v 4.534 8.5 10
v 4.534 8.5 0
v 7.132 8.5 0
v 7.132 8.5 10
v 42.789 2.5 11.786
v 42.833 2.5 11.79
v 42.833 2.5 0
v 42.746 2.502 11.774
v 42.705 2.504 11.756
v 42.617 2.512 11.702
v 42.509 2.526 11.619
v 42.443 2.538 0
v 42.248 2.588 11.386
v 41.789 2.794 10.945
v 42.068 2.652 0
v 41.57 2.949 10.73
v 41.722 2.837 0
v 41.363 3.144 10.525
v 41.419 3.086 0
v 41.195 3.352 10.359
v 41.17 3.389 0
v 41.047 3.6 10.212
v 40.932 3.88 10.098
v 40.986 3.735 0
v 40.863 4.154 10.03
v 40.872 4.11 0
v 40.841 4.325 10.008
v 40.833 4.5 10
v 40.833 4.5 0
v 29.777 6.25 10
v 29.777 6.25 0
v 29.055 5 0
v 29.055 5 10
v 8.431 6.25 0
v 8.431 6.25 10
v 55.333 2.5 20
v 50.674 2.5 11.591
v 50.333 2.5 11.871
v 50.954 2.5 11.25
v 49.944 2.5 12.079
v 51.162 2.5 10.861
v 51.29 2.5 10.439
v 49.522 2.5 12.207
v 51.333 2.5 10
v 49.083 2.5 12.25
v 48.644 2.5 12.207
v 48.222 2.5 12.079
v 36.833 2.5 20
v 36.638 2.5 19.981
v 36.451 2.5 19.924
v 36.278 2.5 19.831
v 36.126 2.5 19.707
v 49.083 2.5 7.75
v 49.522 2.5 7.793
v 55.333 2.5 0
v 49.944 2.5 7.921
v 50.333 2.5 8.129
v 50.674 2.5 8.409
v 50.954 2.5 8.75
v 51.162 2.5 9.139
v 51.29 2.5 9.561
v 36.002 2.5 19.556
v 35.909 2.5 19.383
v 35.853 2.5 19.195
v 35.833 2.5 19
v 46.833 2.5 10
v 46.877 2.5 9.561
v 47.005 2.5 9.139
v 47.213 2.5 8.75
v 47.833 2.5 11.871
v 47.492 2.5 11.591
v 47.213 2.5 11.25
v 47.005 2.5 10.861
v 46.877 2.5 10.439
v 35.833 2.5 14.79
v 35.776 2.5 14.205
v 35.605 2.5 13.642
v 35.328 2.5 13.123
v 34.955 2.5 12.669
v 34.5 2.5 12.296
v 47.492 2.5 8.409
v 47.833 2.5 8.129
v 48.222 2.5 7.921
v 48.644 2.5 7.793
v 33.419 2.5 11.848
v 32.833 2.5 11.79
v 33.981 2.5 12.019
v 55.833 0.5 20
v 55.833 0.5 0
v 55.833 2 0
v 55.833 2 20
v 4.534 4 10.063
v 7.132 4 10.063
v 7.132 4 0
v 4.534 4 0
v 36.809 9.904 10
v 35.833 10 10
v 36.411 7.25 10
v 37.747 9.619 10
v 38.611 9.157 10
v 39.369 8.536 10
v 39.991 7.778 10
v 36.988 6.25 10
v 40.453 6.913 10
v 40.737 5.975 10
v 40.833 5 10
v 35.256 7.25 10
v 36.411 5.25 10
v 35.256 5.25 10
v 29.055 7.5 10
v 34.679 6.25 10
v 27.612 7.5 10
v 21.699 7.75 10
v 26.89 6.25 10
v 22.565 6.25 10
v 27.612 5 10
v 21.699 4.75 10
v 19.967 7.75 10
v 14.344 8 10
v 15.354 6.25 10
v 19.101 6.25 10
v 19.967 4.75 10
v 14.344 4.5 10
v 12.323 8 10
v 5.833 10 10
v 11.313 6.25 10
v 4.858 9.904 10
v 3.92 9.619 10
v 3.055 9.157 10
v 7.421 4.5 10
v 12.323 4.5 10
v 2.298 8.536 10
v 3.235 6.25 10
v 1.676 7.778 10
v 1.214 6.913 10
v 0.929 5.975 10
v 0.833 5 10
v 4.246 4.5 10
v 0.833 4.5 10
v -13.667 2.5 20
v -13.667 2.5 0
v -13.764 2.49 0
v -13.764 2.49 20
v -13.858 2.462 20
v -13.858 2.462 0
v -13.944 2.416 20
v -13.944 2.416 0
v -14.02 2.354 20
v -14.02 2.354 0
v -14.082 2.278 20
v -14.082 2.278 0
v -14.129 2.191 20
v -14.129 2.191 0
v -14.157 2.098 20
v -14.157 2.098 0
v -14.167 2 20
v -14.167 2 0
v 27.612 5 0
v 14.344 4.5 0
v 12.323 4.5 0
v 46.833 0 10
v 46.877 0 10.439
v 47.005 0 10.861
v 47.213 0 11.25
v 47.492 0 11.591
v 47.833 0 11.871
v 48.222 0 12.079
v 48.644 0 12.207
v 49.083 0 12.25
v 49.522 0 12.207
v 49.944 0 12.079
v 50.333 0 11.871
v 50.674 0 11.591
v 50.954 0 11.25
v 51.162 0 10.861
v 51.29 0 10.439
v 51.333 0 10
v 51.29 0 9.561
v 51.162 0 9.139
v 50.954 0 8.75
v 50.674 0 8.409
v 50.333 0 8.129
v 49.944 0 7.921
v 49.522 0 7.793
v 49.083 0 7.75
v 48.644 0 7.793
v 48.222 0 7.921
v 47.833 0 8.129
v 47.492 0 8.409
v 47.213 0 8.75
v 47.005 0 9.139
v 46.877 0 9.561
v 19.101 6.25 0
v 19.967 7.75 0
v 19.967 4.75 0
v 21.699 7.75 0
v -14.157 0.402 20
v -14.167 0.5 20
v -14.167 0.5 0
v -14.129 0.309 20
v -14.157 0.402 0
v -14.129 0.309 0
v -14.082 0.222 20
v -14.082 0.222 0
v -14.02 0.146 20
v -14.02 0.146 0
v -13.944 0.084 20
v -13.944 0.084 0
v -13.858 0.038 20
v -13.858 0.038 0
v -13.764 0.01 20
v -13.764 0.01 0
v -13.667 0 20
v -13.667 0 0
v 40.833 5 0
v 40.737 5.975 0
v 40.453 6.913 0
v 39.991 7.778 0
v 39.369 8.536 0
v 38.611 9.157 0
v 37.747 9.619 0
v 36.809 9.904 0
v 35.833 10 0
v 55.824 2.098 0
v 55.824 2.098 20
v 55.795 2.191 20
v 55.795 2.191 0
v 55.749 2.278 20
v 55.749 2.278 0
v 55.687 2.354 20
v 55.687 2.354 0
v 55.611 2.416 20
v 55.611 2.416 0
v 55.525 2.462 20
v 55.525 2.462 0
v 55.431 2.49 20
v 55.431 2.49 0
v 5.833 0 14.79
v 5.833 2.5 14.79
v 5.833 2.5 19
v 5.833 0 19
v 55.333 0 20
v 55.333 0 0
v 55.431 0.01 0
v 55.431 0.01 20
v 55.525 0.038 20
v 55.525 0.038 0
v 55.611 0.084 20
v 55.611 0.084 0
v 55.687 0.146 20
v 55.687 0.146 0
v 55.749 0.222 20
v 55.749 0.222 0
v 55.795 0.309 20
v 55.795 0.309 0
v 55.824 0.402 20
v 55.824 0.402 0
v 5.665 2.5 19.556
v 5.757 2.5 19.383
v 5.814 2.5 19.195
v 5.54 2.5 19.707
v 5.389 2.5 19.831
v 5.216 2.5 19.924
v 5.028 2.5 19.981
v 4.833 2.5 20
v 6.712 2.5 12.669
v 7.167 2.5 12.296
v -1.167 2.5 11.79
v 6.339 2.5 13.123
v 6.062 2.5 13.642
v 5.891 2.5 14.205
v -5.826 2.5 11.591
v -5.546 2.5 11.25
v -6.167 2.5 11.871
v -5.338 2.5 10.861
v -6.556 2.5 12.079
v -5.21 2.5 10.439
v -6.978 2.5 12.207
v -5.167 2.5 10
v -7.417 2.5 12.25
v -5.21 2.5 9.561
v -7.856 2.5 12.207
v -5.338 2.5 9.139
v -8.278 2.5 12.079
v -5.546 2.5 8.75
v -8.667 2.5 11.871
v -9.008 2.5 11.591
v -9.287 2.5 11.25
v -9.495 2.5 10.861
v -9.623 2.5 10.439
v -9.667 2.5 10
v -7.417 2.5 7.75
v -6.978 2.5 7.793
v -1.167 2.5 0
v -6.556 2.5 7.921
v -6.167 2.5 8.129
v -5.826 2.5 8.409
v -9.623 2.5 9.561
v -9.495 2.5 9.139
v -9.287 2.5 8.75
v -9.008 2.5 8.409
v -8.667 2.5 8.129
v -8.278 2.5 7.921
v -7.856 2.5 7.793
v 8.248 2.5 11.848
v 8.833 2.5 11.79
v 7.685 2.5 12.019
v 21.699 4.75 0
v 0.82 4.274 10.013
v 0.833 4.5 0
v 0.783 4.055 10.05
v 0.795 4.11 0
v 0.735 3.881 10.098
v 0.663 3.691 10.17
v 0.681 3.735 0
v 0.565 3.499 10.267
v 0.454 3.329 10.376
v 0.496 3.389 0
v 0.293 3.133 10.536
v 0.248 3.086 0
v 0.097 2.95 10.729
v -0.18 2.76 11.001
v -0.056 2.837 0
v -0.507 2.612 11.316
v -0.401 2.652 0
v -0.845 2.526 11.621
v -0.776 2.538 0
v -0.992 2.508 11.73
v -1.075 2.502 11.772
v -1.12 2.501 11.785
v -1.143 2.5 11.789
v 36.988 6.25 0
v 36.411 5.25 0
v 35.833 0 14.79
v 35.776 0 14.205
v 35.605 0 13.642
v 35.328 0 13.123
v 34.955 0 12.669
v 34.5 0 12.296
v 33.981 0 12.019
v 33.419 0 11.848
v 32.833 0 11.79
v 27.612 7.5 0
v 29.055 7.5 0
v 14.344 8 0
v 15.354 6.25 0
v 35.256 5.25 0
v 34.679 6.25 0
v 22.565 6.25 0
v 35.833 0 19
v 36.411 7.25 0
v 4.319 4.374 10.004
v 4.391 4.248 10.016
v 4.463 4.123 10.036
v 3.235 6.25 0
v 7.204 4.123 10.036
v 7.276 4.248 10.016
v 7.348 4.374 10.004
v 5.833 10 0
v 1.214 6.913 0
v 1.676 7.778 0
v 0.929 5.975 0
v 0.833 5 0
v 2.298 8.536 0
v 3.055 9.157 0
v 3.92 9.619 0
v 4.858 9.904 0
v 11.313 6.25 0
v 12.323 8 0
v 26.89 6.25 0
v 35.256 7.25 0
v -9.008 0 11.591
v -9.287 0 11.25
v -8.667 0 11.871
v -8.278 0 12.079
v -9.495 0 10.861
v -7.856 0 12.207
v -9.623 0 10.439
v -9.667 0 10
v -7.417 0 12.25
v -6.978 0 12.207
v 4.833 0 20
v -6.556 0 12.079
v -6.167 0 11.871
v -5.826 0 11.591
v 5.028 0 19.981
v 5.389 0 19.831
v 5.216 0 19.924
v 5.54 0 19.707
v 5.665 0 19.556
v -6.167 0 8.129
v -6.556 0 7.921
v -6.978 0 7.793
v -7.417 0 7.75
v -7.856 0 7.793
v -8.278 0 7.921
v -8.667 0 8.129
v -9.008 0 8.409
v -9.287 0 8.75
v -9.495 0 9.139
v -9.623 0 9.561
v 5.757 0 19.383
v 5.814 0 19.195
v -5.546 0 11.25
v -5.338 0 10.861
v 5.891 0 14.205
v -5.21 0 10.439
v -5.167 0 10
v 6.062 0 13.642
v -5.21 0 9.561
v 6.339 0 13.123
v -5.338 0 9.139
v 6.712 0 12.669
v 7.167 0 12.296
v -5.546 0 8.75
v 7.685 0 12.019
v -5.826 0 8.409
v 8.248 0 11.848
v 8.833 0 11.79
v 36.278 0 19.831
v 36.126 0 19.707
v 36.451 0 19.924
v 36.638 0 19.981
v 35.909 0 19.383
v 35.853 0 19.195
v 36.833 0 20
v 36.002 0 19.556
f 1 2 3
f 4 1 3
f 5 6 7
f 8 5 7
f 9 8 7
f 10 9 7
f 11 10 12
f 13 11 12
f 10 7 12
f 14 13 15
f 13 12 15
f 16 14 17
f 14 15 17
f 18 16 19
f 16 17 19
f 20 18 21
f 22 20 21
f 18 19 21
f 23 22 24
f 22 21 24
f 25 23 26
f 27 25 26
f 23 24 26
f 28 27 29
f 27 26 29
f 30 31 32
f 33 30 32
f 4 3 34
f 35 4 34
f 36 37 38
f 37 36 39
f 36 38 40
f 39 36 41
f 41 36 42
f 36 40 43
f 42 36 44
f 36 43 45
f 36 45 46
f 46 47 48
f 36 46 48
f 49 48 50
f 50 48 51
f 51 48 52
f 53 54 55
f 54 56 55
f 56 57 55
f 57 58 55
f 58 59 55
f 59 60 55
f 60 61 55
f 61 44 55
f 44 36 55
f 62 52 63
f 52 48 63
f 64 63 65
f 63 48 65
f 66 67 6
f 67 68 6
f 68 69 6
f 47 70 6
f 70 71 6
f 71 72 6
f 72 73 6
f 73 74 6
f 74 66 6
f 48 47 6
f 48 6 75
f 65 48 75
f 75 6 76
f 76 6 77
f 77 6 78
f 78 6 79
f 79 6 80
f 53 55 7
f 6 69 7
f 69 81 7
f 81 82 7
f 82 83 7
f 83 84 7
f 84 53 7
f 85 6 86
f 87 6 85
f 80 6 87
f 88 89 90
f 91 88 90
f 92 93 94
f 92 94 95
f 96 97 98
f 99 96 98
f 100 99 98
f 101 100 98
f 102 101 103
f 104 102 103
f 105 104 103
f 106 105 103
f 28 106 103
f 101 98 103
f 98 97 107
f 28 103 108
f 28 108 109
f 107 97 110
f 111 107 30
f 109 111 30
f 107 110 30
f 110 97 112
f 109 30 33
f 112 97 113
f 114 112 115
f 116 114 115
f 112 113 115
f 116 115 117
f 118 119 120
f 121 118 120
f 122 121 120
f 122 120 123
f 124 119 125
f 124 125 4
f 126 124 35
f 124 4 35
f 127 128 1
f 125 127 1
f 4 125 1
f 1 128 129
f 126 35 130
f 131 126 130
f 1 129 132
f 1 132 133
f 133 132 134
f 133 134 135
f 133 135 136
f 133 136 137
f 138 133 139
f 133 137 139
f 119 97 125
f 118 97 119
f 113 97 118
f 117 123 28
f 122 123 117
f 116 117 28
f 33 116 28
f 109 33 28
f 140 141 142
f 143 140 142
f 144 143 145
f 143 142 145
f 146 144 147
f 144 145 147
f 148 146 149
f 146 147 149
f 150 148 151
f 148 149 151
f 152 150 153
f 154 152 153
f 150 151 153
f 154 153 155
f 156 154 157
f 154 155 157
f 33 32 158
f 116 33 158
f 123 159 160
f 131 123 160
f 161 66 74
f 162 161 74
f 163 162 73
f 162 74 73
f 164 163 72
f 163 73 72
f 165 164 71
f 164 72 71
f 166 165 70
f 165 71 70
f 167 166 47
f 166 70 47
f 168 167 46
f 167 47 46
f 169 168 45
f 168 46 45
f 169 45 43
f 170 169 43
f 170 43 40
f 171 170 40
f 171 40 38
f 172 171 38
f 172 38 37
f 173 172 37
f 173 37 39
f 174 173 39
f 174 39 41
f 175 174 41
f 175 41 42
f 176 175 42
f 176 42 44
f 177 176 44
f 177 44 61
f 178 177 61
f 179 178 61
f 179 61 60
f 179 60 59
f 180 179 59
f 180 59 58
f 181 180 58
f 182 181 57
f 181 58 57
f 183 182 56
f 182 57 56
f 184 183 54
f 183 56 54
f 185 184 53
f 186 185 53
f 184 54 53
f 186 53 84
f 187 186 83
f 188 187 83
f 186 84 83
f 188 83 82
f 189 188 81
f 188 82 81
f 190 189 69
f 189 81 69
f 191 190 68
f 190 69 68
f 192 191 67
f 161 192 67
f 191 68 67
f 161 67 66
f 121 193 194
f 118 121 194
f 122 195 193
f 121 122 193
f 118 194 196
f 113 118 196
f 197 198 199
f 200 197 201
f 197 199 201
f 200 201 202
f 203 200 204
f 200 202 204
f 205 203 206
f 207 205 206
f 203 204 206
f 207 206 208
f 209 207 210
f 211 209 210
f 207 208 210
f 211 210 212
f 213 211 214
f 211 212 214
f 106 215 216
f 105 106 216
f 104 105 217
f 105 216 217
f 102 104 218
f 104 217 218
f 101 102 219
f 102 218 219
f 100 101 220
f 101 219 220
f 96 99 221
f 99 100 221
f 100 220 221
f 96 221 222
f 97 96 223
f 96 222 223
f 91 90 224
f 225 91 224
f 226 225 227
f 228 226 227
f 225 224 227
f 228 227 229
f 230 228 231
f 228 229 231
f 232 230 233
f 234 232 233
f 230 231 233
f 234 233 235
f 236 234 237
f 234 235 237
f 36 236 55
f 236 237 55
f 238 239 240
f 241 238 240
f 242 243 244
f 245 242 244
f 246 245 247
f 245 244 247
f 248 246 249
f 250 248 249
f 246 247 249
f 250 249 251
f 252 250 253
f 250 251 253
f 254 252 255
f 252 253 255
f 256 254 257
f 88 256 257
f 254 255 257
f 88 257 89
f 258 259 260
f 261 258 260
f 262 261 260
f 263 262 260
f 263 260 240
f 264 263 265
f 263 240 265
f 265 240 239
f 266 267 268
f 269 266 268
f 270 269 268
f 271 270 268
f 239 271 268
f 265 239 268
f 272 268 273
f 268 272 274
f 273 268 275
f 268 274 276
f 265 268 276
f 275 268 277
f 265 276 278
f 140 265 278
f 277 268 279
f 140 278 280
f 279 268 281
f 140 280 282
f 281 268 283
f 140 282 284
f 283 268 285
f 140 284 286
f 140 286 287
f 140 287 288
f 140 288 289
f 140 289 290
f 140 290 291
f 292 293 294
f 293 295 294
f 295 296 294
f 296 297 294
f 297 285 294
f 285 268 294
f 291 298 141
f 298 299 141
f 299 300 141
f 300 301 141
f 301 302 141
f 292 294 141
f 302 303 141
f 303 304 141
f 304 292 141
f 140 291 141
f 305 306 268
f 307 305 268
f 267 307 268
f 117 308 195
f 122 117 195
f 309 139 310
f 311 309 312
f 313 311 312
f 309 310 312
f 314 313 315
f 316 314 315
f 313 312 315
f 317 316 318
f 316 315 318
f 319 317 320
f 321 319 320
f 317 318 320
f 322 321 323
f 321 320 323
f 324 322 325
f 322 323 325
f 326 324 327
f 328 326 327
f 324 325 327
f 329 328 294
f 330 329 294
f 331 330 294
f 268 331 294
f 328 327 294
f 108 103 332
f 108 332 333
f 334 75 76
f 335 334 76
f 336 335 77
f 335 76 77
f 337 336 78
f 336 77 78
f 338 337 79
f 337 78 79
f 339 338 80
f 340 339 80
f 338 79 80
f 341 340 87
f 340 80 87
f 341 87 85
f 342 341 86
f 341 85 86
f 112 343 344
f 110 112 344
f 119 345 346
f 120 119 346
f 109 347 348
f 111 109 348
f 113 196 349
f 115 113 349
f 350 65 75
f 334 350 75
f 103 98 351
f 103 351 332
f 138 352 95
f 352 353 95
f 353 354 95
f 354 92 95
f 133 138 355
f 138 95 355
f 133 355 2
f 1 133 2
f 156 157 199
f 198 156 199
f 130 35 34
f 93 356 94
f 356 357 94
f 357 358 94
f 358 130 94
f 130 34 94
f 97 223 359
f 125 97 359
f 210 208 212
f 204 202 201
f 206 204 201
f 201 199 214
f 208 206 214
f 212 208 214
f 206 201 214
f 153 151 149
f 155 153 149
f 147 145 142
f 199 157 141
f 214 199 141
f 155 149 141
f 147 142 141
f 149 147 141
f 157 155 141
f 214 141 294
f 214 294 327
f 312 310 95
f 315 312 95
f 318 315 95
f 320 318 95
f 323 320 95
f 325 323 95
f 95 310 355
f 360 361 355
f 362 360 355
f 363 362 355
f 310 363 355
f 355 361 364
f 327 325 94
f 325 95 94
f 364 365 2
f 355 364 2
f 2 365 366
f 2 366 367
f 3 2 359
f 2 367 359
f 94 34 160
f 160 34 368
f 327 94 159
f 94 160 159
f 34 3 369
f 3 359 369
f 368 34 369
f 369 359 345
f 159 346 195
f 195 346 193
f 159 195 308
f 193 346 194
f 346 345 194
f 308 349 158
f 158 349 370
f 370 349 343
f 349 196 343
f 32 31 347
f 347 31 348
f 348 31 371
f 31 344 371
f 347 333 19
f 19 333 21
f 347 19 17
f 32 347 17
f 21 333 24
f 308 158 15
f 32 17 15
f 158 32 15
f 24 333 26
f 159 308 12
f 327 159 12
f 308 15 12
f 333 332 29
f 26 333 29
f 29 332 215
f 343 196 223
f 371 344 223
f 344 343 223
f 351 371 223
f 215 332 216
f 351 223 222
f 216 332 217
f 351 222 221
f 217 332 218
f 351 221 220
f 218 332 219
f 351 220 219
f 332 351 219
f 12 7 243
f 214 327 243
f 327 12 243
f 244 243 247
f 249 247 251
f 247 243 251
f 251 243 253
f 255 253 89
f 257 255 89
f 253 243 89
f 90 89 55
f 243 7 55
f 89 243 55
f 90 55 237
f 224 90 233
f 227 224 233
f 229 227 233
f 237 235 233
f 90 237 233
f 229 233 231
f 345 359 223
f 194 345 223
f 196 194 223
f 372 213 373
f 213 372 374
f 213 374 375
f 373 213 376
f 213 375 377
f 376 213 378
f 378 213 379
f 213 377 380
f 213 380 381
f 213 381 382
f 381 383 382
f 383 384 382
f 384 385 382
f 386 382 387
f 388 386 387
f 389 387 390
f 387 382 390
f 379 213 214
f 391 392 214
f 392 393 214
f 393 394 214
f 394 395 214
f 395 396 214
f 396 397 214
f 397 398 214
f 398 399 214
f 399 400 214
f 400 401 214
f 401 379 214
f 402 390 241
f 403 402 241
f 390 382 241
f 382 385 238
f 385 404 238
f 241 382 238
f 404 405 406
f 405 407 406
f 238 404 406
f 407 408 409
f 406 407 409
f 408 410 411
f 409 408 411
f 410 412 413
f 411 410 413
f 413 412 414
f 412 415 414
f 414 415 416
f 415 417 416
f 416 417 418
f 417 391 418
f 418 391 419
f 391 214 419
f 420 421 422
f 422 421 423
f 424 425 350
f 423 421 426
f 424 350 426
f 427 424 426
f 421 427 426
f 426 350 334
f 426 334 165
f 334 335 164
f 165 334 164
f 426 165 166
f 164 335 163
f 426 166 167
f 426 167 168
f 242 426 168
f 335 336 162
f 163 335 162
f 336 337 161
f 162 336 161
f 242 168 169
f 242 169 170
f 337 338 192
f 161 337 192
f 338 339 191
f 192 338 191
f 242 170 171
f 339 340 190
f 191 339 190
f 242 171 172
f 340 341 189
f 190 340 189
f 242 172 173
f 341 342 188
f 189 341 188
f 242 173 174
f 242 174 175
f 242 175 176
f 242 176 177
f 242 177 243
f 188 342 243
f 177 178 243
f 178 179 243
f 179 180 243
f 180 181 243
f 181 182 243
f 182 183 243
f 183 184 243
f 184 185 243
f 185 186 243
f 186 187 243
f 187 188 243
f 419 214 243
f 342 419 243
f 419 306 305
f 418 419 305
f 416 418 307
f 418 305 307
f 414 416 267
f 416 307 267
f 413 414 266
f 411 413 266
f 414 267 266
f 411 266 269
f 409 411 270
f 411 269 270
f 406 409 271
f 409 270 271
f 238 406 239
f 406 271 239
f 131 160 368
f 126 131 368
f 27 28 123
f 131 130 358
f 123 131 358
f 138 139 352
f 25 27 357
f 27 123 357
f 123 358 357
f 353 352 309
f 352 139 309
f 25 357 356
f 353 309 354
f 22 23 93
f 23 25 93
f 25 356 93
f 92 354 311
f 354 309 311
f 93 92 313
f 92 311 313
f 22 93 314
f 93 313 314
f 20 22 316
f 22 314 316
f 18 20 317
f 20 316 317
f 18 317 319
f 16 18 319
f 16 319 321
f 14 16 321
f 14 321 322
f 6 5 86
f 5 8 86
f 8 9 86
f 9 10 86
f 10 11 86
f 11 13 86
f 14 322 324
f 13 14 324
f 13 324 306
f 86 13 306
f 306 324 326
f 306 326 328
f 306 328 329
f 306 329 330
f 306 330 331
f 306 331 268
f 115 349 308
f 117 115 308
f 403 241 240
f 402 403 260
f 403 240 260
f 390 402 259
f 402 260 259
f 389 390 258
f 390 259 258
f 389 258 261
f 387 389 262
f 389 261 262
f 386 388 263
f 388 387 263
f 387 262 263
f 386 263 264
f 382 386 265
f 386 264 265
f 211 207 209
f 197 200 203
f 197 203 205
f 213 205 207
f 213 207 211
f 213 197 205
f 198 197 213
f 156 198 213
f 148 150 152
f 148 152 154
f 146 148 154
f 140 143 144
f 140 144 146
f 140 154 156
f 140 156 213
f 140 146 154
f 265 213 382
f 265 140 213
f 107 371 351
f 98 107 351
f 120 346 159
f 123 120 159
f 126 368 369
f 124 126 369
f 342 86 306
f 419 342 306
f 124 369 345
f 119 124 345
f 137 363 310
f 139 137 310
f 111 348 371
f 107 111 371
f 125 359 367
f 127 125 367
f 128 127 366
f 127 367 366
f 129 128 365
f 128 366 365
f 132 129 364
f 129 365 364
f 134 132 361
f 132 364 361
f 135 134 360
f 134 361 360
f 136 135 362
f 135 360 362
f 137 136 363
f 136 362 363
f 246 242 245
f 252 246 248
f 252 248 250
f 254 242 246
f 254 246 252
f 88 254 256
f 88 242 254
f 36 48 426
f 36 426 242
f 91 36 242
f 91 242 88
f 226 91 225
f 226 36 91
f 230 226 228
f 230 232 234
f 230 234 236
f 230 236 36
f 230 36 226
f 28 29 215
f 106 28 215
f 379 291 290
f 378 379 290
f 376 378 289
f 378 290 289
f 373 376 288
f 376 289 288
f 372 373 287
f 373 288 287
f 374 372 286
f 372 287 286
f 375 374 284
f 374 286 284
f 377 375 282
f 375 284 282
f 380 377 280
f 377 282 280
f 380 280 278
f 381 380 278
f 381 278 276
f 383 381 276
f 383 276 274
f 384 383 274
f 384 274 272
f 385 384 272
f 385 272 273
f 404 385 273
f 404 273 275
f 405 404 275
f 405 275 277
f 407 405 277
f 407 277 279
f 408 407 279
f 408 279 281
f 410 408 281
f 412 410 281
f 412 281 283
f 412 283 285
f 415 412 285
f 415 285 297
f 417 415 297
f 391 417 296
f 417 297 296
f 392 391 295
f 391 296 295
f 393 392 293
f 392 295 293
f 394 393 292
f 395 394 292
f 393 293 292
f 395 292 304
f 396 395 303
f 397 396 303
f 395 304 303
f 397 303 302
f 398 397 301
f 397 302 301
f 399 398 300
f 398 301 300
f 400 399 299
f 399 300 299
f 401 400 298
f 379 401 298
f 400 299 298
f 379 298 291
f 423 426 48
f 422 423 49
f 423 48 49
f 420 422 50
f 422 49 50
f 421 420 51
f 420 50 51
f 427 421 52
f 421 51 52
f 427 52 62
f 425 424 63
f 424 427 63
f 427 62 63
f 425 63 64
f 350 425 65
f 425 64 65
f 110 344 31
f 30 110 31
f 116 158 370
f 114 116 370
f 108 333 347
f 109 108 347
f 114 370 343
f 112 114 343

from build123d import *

# Parameters (mm, degrees)
F1_DEPTH = 20
F2_R     = 2.25
F3_DEPTH = 25
F6_DEPTH = 200
F8_DEPTH = 25


with BuildPart() as f1:
    # F0 (on Top) → F1 (new body)
    with BuildSketch(Plane.XY):
        with BuildLine():
            Line((-14.1666658925, 2), (-14.1666658925, 0.5))
            ThreePointArc((-14.1666658925, 0.5), (-14.0202192831, 0.1464466094), (-13.6666658925, 0))
            Line((-13.6666658925, 0), (55.3333341075, 0))
            ThreePointArc((55.3333341075, 0), (55.6868874981, 0.1464466094), (55.8333341075, 0.5))
            Line((55.8333341075, 0.5), (55.8333341075, 2))
            ThreePointArc((55.8333341075, 2), (55.6868874981, 2.3535533906), (55.3333341075, 2.5))
            Line((55.3333341075, 2.5), (42.8333341075, 2.5))
            ThreePointArc((42.8333341075, 2.5), (41.4191205451, 3.0857864376), (40.8333341075, 4.5))
            Line((40.8333341075, 4.5), (40.8333341075, 5))
            ThreePointArc((40.8333341075, 5), (39.3688680134, 8.5355339059), (35.8333341075, 10))
            Line((35.8333341075, 10), (5.8333341075, 10))
            ThreePointArc((5.8333341075, 10), (2.2978002016, 8.5355339059), (0.8333341075, 5))
            Line((0.8333341075, 5), (0.8333341075, 4.5))
            ThreePointArc((0.8333341075, 4.5), (0.2475476699, 3.0857864376), (-1.1666658925, 2.5))
            Line((-1.1666658925, 2.5), (-13.6666658925, 2.5))
            ThreePointArc((-13.6666658925, 2.5), (-14.0202192831, 2.3535533906), (-14.1666658925, 2))
        make_face()
        Polygon((3.2352578961, 6.25), (4.5342960018, 8.5), (7.1323722132, 8.5), (8.4314103188, 6.25), (7.1323722132, 4), (4.5342960018, 4), align=None, mode=Mode.SUBTRACT)
        Polygon((11.3126081653, 6.25), (12.3229711364, 8), (14.3436970786, 8), (15.3540600497, 6.25), (14.3436970786, 4.5), (12.3229711364, 4.5), align=None, mode=Mode.SUBTRACT)
        Polygon((19.1012832999, 6.25), (19.9673087037, 7.75), (21.6993595113, 7.75), (22.5653849151, 6.25), (21.6993595113, 4.75), (19.9673087037, 4.75), align=None, mode=Mode.SUBTRACT)
        Polygon((26.8899584345, 6.25), (27.611646271, 7.5), (29.055021944, 7.5), (29.7767097805, 6.25), (29.055021944, 5), (27.611646271, 5), align=None, mode=Mode.SUBTRACT)
        Polygon((34.6786335691, 6.25), (35.2559838383, 7.25), (36.4106843767, 7.25), (36.9880346459, 6.25), (36.4106843767, 5.25), (35.2559838383, 5.25), align=None, mode=Mode.SUBTRACT)
    extrude(amount=F1_DEPTH)

    # F2 (on face) → F3 (cut)
    with BuildSketch(Plane(origin=(0, 2.5, 0), x_dir=(-1, 0, 0), z_dir=(0, 1, 0))):
        with Locations((7.4166658925, 10)):
            Circle(F2_R)
        with Locations((-49.0833341075, 10)):
            Circle(F2_R)
    extrude(amount=-F3_DEPTH, mode=Mode.SUBTRACT)

    # F5 (on face) → F6 (cut)
    with BuildSketch(Plane(origin=(-14.1666658925, 0, 0), x_dir=(0, -1, 0), z_dir=(-1, 0, 0))):
        with BuildLine():
            Line((-2.5, 12.2343860567), (-2.5, 20))
            Line((-2.5, 20), (-10, 20))
            Line((-10, 20), (-10, 10))
            Line((-10, 10), (-4.5, 10))
            ThreePointArc((-4.5, 10), (-3.1579102698, 10.5129202042), (-2.5, 11.7902009315))
            Line((-2.5, 11.7902009315), (-2.5, 12.2343860567))
        make_face()
    extrude(amount=-F6_DEPTH, mode=Mode.SUBTRACT)

    # F7 (on face) → F8 (cut)
    with BuildSketch(Plane(origin=(0, 2.5, 0), x_dir=(-1, 0, 0), z_dir=(0, 1, 0))):
        with BuildLine():
            Line((-5.8333341075, 20), (-35.8333341075, 20))
            Line((-35.8333341075, 20), (-36.8333341075, 20))
            ThreePointArc((-36.8333341075, 20), (-36.1262273263, 19.7071067812), (-35.8333341075, 19))
            Line((-35.8333341075, 19), (-35.8333341075, 14.7902009315))
            ThreePointArc((-35.8333341075, 14.7902009315), (-34.9546544511, 12.668880588), (-32.8333341075, 11.7902009315))
            Line((-32.8333341075, 11.7902009315), (-8.8333341075, 11.7902009315))
            ThreePointArc((-8.8333341075, 11.7902009315), (-6.7120137639, 12.668880588), (-5.8333341075, 14.7902009315))
            Line((-5.8333341075, 14.7902009315), (-5.8333341075, 19))
            ThreePointArc((-5.8333341075, 19), (-5.5404408887, 19.7071067812), (-4.8333341075, 20))
            Line((-4.8333341075, 20), (-5.8333341075, 20))
        make_face()
    extrude(amount=-F8_DEPTH, mode=Mode.SUBTRACT)


solid = f1.part
